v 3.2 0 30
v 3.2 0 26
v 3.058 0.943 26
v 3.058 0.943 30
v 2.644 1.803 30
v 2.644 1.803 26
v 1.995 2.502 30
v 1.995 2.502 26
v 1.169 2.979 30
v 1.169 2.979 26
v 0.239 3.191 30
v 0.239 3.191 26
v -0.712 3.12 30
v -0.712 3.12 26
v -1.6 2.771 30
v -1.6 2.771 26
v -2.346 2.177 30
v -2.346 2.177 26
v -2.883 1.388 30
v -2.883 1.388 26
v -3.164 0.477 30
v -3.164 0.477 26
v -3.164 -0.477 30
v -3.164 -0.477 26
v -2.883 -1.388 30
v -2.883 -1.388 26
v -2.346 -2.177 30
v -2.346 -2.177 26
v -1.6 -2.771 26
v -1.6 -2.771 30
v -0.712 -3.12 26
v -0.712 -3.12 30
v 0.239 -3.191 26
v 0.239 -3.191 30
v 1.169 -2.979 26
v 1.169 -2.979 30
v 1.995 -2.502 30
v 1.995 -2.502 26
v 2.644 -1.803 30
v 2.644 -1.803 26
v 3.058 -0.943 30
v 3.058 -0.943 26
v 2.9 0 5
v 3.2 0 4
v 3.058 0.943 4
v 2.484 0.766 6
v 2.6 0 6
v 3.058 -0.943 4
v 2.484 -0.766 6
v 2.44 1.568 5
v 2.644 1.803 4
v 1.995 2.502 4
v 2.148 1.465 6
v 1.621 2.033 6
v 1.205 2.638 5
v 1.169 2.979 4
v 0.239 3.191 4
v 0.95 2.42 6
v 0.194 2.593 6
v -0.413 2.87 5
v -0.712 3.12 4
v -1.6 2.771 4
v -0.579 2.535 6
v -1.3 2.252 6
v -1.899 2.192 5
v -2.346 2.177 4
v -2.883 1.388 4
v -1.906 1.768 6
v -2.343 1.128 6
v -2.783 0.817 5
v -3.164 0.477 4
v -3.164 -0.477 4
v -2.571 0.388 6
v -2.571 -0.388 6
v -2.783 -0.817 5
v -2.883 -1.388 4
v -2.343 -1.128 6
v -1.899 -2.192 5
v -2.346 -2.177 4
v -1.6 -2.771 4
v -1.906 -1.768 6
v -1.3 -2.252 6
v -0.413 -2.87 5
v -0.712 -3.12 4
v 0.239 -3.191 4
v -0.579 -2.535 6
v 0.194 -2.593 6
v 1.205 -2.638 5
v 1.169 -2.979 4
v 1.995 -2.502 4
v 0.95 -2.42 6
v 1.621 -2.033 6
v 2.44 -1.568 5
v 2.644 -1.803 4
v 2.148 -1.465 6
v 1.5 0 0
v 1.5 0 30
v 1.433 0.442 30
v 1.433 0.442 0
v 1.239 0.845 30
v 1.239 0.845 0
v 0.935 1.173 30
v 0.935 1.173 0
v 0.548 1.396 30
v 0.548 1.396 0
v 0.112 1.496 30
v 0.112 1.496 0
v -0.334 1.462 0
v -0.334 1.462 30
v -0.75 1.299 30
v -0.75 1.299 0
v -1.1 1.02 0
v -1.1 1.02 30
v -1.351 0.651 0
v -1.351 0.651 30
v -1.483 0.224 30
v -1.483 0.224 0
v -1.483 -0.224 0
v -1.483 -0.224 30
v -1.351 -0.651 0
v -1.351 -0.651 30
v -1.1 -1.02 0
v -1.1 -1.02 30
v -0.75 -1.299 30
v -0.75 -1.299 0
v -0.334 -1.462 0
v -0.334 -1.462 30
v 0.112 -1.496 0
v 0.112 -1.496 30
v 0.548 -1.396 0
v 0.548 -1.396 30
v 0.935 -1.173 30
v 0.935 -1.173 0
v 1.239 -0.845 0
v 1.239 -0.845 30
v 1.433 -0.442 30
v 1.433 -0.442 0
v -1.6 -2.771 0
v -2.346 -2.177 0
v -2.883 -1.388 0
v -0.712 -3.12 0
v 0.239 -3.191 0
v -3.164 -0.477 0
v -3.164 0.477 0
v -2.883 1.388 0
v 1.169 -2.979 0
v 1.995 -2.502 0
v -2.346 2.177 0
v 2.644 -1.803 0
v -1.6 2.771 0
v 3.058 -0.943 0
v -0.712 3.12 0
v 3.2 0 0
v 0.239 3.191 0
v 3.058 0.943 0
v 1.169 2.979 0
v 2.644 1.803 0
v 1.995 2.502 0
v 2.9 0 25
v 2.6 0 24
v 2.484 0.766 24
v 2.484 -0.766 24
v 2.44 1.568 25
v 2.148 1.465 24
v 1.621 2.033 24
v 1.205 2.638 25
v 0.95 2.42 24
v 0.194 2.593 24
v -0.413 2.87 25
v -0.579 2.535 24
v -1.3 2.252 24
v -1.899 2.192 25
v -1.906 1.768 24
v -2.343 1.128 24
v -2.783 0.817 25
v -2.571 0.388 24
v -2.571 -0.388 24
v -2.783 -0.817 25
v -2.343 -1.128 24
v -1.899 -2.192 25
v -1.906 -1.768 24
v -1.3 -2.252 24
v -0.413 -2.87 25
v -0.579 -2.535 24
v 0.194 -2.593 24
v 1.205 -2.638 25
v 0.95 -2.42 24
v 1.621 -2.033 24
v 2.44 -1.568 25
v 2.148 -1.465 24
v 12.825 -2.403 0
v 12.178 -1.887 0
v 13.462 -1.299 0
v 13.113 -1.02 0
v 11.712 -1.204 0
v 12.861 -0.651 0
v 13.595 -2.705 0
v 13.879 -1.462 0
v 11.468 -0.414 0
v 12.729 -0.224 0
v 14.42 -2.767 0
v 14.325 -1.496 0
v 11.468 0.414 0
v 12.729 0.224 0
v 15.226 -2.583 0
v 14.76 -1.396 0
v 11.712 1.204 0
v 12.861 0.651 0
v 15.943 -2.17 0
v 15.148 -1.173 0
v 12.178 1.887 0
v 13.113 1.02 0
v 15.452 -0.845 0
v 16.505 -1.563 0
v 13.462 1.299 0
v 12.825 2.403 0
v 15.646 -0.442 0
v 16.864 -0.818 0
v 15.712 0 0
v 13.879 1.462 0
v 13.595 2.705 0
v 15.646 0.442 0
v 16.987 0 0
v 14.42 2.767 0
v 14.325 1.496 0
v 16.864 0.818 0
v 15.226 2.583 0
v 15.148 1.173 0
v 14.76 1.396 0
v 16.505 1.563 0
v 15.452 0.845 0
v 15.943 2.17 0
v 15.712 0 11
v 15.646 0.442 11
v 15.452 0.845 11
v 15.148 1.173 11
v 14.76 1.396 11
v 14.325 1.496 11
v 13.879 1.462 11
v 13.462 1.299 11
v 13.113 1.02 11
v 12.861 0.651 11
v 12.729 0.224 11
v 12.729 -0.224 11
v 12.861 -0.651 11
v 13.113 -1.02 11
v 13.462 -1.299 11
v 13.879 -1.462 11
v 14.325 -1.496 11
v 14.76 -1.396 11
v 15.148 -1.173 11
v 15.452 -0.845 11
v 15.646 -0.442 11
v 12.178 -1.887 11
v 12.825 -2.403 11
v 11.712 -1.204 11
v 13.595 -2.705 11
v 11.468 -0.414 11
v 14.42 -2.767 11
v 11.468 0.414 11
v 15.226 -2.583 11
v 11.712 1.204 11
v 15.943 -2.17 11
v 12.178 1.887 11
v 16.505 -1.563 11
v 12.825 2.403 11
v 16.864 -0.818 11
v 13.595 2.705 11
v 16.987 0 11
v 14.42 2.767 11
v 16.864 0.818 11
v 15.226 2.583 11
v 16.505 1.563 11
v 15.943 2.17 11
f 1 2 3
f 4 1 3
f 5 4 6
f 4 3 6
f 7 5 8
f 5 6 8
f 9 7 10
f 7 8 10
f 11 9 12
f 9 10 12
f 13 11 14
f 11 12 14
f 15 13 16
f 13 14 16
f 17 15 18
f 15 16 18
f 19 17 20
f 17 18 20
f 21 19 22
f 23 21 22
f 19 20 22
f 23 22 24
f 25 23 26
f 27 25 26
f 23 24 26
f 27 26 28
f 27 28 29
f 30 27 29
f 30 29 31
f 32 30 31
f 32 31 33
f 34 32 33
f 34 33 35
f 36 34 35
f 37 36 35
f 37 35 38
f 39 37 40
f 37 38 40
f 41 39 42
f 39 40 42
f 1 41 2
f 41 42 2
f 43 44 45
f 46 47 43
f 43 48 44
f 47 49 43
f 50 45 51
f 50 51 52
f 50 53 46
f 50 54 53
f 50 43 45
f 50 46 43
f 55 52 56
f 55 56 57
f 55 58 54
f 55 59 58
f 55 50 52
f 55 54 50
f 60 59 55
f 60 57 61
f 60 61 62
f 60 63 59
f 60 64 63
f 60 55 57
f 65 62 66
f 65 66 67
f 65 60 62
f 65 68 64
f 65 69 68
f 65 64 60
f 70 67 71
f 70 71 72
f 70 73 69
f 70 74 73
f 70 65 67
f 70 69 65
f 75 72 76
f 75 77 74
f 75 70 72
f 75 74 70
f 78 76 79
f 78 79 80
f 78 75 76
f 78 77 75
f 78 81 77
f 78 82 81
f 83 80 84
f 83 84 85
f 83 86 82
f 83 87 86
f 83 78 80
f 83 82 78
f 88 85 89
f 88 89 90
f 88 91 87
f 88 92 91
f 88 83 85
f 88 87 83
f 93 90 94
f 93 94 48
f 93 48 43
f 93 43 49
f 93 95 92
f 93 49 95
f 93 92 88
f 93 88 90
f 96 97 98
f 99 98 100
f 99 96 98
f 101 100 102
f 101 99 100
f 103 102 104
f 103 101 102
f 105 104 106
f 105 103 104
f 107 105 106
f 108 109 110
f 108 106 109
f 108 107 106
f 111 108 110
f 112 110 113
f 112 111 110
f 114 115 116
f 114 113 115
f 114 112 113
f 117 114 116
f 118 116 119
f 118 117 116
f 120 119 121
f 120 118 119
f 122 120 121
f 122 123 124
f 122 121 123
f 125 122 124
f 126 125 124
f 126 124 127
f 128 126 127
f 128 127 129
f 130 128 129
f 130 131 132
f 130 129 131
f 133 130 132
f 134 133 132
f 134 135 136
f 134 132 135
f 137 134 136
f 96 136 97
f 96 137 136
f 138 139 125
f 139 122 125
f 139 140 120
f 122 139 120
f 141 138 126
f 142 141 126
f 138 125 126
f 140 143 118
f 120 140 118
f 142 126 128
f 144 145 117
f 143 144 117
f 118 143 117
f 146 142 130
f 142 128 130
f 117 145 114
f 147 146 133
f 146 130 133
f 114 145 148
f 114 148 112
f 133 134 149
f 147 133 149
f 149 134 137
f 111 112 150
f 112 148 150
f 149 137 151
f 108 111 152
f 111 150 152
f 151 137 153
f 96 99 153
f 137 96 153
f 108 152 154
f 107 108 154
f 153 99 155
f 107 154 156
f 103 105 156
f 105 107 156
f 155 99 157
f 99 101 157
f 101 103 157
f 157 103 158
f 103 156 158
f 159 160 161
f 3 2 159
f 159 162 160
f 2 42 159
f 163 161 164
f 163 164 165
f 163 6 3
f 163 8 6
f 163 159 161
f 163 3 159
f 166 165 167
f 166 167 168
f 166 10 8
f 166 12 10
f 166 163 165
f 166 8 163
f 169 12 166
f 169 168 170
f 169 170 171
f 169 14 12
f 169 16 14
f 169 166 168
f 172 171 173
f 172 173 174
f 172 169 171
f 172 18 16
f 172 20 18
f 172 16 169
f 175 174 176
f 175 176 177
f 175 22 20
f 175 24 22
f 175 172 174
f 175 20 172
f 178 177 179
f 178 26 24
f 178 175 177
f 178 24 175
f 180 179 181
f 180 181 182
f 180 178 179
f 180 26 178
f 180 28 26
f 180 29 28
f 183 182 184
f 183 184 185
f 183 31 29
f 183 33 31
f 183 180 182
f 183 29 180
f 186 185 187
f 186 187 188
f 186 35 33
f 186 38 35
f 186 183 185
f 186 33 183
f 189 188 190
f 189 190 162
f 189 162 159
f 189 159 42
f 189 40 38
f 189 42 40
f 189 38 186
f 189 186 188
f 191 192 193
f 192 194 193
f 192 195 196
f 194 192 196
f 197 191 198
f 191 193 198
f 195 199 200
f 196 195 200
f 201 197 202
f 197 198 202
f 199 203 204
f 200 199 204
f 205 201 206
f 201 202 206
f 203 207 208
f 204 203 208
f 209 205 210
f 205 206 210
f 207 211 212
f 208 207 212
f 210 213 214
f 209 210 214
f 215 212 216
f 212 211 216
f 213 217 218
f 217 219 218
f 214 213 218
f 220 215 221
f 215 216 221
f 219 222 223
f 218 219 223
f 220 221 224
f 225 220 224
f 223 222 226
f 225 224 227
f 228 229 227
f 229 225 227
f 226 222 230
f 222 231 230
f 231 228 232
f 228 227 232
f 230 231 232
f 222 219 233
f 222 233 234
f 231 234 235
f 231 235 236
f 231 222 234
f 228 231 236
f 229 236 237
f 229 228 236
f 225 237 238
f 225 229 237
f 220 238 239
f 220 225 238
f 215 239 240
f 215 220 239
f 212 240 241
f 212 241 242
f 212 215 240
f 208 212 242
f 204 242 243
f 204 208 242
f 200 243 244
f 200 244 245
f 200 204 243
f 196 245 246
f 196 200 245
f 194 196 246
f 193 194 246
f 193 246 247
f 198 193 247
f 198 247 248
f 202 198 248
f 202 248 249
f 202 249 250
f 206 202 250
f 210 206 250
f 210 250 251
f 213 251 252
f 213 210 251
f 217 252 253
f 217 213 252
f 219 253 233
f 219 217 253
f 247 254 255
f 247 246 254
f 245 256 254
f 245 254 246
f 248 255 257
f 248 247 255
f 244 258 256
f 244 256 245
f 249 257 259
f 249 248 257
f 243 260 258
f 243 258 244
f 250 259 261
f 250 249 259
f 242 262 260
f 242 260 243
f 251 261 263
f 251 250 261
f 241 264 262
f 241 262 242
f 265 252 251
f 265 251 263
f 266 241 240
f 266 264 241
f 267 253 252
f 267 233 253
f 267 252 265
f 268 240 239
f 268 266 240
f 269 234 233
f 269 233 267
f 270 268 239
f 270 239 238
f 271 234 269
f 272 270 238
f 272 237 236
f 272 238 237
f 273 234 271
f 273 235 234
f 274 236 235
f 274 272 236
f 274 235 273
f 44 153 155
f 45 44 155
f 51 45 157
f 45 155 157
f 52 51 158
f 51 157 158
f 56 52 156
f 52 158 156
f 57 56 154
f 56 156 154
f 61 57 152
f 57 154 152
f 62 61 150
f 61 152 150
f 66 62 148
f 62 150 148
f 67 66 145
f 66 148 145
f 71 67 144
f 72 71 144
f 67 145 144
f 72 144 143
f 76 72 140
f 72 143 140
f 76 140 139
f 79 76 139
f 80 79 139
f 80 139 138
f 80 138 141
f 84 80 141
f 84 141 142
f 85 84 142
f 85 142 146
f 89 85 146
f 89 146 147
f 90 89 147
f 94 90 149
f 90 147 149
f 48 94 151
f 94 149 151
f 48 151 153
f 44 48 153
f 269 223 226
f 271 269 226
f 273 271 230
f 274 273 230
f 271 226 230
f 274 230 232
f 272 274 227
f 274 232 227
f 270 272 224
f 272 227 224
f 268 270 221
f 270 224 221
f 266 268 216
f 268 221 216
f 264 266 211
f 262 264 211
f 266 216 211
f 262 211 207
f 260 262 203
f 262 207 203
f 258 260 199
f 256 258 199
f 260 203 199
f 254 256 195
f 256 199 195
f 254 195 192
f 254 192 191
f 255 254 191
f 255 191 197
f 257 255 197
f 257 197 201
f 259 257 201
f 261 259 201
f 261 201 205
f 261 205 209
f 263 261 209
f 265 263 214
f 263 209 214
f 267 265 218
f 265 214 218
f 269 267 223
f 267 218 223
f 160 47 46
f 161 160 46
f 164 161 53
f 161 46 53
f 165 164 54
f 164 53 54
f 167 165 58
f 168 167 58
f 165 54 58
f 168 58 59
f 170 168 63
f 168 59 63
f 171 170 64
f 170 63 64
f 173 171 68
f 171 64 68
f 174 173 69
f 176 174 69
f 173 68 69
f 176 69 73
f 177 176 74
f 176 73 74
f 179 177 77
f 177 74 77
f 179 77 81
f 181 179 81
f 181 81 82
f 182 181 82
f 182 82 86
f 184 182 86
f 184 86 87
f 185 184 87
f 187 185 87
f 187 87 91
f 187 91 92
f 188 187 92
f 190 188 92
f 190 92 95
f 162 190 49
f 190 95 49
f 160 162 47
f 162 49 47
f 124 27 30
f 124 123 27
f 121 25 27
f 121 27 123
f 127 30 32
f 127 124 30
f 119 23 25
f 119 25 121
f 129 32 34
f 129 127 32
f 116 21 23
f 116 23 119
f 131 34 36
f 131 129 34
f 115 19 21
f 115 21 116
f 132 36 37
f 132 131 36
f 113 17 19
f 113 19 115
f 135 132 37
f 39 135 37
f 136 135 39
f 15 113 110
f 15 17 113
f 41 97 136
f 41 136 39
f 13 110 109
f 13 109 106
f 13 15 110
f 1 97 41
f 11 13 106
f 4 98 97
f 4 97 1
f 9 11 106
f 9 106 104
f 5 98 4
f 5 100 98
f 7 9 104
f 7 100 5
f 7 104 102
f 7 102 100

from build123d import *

# Parameters (mm, degrees)
F0_R      = 3.2
F1_DEPTH  = 4
F1_FACE_R = 3.2
F3_R      = 2.6
F9_DEPTH  = 18
F6_R      = 2.6
F8_R      = 3.2
F11_DEPTH = 4
F12_R     = 1.5
F13_DEPTH = 50
F14_R     = 2.775
F14_R_2   = 1.5
F15_DEPTH = 11


with BuildPart() as f1:
    # F0 (on Top) → F1 (new body)
    with BuildSketch(Plane.XY):
        Circle(F0_R)
    extrude(amount=F1_DEPTH)

    # F1_face (on face) → F4 section 0
    with BuildSketch(Plane.XY.offset(4)):
        Circle(F1_FACE_R)
    # F3 (on offset) → F4 section 1
    with BuildSketch(Plane.XY.offset(6)):
        Circle(F3_R)
    loft()

    # F3 (on offset) → F9 (join)
    with BuildSketch(Plane.XY.offset(6)):
        Circle(F3_R)
    extrude(amount=F9_DEPTH)

    # F6 (on offset) → F10 section 0
    with BuildSketch(Plane.XY.offset(24)):
        Circle(F6_R)
    # F8 (on offset) → F10 section 1
    with BuildSketch(Plane.XY.offset(26)):
        Circle(F8_R)
    loft()

    # F8 (on offset) → F11 (join)
    with BuildSketch(Plane.XY.offset(26)):
        Circle(F8_R)
    extrude(amount=F11_DEPTH)

    # F12 (on Top) → F13 (cut)
    with BuildSketch(Plane.XY):
        Circle(F12_R)
    extrude(amount=F13_DEPTH, mode=Mode.SUBTRACT)


with BuildPart() as f15:
    # F14 (on Top) → F15 (new body)
    with BuildSketch(Plane.XY):
        with Locations((14.212486, 0)):
            Circle(F14_R)
        with Locations((14.212486, 0)):
            Circle(F14_R_2, mode=Mode.SUBTRACT)
    extrude(amount=F15_DEPTH)


solid = Compound([f1.part, f15.part])
